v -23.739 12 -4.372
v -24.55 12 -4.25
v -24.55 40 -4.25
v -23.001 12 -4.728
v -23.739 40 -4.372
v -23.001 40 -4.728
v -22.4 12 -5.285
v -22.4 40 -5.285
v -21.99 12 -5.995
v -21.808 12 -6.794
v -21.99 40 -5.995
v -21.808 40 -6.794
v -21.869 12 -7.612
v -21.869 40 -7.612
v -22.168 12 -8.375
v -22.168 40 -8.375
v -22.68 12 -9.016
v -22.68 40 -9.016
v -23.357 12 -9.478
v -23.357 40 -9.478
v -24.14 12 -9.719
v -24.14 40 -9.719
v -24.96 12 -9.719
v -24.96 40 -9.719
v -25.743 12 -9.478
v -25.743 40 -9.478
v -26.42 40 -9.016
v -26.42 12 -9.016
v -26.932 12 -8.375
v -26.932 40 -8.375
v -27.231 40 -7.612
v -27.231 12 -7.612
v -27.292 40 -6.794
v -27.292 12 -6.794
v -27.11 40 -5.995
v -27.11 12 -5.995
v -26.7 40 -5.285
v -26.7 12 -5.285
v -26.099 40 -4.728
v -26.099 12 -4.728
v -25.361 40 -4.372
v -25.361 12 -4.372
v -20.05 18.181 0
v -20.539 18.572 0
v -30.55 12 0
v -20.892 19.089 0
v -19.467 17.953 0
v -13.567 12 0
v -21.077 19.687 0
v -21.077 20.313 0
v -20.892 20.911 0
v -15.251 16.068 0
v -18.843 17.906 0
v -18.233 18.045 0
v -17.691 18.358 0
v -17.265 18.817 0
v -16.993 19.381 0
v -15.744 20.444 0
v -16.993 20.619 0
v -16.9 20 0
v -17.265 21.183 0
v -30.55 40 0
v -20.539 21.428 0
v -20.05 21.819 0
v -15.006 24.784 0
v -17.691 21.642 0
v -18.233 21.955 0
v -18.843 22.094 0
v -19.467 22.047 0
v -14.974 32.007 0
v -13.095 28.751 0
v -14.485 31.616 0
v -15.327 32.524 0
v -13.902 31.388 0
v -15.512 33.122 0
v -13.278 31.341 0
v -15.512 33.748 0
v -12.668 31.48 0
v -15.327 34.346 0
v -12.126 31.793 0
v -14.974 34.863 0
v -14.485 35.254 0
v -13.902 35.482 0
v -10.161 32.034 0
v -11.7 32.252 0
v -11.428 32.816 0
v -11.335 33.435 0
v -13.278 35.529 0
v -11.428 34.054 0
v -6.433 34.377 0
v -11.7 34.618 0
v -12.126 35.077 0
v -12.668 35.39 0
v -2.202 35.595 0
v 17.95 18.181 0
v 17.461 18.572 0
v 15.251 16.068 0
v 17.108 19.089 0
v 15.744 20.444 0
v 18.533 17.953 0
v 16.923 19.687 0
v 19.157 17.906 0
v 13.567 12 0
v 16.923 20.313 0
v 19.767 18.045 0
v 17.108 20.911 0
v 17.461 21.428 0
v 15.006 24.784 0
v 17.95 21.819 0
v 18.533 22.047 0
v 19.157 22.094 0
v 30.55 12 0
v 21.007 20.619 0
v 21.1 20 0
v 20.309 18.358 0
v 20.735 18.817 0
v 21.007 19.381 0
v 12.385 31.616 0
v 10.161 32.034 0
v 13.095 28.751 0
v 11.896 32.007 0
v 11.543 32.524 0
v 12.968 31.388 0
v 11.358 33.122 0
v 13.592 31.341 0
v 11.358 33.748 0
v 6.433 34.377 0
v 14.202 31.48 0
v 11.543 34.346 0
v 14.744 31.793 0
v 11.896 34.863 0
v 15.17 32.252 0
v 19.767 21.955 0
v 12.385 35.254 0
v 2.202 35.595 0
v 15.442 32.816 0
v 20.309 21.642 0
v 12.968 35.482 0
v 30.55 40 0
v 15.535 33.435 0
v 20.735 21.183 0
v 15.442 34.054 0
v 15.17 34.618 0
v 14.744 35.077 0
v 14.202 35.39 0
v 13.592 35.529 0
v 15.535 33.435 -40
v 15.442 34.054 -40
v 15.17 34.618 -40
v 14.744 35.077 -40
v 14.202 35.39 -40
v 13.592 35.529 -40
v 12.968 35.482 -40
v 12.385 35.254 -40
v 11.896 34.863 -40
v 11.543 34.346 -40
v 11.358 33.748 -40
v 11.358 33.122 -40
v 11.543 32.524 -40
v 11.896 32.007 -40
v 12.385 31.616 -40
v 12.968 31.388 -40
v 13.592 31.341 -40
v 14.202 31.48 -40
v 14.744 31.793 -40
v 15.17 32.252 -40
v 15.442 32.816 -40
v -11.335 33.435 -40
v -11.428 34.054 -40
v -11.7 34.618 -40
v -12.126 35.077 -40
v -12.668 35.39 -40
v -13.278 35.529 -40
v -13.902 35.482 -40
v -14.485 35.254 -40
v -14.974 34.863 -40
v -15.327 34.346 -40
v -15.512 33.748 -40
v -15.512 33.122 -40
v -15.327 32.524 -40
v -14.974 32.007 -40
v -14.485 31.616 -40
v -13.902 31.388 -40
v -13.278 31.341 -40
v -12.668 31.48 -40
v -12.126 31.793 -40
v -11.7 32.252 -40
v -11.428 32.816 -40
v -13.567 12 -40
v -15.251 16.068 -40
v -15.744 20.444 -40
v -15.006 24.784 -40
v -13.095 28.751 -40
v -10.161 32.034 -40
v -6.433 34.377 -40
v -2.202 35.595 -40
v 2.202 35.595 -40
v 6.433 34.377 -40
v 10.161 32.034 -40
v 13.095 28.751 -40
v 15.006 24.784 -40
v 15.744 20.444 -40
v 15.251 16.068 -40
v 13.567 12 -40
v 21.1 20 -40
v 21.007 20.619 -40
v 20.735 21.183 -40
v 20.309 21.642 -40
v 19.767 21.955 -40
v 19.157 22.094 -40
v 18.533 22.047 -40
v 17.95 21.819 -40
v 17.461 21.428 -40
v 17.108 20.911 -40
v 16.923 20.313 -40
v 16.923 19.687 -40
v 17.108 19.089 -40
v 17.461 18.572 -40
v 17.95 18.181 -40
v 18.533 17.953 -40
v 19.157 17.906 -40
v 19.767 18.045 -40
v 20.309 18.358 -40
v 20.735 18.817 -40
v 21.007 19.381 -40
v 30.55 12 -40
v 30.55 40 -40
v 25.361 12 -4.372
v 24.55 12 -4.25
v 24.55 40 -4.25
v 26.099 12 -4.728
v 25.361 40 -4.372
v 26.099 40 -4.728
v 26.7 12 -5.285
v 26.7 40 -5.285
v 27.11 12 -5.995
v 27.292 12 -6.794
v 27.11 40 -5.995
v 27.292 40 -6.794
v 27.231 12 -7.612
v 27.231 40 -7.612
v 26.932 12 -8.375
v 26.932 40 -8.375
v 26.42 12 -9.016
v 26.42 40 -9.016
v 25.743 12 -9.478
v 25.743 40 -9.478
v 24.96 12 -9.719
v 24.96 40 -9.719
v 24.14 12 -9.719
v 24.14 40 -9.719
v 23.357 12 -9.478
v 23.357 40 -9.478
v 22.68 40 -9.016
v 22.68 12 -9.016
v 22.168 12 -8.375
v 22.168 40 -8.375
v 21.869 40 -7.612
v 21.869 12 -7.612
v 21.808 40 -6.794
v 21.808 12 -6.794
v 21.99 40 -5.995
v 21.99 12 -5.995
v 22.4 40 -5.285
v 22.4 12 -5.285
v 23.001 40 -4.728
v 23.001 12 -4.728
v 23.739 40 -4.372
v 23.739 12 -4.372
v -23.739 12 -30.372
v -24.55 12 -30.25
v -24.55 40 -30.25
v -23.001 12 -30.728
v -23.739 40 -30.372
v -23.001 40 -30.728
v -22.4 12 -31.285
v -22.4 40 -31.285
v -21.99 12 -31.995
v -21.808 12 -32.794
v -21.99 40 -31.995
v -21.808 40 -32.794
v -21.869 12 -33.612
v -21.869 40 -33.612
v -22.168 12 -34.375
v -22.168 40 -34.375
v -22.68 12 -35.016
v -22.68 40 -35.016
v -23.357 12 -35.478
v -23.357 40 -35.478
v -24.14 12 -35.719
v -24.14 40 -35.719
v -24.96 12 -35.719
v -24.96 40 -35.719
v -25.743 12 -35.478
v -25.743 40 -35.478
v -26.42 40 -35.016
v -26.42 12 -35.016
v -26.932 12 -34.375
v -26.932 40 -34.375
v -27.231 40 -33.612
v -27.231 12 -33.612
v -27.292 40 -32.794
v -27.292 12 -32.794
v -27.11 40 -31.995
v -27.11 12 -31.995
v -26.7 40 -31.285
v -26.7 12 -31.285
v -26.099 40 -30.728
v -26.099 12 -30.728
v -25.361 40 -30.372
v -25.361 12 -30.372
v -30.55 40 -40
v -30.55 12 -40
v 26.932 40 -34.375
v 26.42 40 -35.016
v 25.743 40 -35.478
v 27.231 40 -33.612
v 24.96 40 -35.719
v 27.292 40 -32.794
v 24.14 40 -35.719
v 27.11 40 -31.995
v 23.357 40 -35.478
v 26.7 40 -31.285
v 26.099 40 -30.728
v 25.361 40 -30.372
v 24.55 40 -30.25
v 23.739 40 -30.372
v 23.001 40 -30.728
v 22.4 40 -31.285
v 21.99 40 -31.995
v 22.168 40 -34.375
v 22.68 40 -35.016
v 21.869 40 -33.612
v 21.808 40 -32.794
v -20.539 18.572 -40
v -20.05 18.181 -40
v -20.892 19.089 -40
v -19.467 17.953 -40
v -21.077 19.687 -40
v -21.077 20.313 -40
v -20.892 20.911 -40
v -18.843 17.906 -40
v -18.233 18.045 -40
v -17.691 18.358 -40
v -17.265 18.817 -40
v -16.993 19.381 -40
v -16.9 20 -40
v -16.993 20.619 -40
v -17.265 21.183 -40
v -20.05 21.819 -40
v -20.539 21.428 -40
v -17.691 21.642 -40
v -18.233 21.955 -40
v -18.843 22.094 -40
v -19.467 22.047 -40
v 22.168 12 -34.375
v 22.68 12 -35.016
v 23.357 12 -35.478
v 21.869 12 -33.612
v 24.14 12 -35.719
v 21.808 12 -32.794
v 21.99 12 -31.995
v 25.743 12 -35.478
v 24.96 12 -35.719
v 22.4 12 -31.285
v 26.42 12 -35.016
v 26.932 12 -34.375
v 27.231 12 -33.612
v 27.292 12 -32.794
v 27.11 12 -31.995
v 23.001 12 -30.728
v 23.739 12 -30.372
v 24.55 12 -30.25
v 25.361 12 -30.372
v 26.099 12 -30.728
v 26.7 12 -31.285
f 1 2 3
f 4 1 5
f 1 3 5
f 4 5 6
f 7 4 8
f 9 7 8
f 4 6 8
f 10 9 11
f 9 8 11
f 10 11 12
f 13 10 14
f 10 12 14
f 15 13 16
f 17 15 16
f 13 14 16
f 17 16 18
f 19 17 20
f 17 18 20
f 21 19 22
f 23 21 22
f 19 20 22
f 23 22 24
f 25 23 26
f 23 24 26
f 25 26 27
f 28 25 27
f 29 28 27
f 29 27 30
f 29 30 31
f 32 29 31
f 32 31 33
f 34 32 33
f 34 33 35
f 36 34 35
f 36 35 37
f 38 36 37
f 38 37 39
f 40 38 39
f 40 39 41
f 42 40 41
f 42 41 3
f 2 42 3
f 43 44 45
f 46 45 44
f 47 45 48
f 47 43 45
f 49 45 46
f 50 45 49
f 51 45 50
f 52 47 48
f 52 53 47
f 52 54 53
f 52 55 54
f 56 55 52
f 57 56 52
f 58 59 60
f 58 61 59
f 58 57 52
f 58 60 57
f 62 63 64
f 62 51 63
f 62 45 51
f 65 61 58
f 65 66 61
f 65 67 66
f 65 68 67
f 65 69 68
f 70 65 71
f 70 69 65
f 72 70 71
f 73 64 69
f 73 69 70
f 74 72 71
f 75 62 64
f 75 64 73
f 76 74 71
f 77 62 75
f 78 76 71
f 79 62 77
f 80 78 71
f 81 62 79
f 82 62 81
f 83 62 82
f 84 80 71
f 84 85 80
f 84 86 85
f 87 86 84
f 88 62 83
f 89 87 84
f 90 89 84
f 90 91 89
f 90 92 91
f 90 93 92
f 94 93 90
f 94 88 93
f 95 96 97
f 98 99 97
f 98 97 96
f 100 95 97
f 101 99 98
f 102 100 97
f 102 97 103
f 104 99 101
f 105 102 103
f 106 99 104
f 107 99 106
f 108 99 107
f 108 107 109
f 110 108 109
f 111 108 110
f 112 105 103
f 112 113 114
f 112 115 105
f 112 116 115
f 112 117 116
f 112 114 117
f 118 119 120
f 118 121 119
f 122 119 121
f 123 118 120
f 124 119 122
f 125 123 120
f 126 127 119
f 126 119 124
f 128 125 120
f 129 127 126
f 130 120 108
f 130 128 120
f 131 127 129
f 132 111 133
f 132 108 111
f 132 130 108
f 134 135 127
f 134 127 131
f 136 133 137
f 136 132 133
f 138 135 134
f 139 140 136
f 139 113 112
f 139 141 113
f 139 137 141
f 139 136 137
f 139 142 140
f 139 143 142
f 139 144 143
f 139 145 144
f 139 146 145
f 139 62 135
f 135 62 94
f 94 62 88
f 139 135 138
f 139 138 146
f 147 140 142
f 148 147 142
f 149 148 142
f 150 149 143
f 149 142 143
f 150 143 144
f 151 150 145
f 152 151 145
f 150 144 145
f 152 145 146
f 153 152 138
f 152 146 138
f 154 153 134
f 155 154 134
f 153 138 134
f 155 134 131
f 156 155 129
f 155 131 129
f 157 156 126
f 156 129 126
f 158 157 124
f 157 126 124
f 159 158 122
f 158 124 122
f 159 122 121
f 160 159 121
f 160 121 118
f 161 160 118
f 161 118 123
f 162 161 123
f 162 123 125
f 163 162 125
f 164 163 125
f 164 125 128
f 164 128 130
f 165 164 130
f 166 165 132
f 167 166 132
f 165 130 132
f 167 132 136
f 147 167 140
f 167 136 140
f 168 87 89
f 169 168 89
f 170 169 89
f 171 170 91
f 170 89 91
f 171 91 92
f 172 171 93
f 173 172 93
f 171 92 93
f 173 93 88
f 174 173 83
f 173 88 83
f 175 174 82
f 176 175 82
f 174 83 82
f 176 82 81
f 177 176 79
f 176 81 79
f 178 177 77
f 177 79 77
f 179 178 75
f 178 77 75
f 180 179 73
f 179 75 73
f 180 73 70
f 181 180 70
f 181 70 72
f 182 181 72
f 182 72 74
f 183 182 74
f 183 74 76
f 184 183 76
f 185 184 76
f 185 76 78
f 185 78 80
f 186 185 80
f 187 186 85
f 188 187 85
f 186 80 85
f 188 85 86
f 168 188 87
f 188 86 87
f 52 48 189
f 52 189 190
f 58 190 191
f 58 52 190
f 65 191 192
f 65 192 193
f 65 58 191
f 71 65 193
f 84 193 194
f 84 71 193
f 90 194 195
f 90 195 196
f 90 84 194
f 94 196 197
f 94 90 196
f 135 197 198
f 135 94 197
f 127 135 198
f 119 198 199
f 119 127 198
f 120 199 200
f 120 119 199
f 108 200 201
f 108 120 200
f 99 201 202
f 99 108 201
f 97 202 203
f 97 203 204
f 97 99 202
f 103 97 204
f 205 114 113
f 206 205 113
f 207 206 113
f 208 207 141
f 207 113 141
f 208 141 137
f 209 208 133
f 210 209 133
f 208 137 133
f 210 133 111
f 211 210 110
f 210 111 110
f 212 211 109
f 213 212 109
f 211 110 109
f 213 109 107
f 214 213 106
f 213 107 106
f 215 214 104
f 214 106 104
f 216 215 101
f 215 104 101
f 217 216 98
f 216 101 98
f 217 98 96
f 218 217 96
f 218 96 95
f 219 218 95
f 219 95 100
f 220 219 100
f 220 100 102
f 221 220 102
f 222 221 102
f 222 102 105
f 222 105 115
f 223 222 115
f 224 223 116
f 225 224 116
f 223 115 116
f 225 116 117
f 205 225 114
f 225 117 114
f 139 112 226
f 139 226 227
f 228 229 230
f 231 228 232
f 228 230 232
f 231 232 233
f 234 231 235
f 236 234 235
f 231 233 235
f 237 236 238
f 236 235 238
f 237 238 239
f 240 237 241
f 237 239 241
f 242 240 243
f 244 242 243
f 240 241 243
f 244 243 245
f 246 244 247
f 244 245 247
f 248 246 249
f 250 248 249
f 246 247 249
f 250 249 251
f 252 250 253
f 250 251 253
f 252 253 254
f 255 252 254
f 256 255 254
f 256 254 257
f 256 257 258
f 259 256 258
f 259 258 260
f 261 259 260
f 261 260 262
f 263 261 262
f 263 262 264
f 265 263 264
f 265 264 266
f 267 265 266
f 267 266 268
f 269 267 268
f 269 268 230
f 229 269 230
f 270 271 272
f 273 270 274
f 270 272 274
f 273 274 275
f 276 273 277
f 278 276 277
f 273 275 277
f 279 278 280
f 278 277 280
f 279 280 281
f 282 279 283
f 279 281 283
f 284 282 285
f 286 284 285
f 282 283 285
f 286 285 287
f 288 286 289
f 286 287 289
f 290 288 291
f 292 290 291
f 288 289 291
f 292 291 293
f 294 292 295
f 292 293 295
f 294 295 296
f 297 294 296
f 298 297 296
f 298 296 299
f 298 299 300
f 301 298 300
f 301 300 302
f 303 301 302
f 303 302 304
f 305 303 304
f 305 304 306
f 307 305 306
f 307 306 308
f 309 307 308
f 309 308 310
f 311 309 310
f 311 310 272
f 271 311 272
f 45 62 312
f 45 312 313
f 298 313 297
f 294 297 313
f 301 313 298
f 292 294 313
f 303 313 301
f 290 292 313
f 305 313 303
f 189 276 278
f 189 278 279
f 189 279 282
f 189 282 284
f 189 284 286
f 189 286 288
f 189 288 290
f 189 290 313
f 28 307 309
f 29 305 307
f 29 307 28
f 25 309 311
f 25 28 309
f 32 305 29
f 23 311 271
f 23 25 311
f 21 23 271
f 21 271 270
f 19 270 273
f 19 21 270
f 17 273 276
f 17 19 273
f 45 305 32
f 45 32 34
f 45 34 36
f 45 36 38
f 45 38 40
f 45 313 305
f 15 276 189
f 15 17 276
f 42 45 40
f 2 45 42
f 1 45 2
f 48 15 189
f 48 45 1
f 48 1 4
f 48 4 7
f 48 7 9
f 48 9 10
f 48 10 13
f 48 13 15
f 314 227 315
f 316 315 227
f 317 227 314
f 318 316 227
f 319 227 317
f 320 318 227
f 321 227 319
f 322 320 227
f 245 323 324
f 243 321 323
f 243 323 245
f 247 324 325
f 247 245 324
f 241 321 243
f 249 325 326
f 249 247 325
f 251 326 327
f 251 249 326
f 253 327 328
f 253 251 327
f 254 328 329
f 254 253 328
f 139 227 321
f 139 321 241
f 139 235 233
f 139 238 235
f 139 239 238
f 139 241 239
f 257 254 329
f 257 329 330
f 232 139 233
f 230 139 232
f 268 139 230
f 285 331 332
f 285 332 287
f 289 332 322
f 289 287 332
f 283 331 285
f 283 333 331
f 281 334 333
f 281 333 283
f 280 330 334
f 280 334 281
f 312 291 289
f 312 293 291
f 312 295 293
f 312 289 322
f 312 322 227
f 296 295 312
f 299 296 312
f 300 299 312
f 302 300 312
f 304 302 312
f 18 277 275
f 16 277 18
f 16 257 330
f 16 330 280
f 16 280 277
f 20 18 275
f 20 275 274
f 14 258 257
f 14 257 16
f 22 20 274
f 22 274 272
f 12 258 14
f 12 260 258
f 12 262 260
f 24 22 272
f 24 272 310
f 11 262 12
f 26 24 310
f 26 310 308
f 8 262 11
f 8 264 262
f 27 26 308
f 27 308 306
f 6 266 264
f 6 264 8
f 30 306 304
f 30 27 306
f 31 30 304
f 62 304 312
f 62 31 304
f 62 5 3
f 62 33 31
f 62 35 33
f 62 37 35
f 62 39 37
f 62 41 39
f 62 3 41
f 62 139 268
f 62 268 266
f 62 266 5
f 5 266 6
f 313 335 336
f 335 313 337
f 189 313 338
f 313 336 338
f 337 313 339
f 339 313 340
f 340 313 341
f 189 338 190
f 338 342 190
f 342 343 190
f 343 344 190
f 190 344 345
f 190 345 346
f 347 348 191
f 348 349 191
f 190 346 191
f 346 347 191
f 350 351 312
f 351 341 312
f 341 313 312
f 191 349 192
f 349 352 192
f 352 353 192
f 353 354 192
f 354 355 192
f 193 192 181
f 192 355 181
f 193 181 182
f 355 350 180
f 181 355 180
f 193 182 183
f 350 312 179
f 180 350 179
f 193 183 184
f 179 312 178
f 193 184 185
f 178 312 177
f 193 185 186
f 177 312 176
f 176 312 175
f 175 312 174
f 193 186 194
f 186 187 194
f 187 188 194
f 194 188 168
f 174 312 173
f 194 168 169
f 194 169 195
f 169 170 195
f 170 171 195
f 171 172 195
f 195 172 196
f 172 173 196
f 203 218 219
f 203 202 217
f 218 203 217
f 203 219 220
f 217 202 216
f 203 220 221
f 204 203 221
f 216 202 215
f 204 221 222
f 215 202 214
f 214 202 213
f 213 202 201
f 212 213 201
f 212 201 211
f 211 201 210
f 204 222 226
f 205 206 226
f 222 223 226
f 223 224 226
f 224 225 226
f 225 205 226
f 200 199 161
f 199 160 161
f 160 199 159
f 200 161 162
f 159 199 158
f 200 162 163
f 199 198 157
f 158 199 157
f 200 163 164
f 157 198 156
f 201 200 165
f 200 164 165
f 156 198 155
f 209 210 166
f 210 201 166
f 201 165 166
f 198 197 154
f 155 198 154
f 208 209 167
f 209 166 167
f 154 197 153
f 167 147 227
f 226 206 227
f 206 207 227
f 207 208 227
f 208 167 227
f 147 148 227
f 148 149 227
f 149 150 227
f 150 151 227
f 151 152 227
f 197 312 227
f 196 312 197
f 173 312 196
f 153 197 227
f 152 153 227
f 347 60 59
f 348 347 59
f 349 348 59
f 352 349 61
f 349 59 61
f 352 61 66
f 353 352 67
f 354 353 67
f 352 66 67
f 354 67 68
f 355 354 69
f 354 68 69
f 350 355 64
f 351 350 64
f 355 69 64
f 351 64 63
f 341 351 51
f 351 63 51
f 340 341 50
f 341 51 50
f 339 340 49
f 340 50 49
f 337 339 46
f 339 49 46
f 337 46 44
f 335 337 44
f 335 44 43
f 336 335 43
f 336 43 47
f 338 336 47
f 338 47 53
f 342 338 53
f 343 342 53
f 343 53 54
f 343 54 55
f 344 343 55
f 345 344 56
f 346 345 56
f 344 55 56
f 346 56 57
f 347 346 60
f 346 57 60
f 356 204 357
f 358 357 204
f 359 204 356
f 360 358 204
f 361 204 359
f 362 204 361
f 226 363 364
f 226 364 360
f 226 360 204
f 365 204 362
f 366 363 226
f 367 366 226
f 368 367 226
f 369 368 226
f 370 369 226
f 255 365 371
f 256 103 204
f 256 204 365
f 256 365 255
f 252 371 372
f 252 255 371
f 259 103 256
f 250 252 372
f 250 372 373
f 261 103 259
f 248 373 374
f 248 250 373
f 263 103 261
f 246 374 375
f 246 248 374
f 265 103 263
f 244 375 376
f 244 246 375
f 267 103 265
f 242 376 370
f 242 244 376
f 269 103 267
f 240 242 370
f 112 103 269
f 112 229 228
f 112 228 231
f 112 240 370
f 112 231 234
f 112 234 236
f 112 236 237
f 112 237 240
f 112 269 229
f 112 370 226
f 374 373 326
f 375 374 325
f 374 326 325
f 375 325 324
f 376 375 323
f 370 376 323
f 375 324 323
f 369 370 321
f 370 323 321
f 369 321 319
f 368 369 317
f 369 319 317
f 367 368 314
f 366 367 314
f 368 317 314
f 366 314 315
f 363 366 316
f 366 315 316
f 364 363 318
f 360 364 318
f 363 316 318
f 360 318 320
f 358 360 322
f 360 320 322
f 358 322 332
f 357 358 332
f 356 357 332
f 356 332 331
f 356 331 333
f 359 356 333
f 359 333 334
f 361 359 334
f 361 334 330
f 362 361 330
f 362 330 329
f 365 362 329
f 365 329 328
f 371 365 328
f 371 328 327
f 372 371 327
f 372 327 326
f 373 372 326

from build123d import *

# Parameters (mm, degrees)
SKETCH1_R           = 2.1
BOSS_EXTRUDE1_DEPTH = 40
SKETCH2_R           = 2.75
CUT_EXTRUDE1_DEPTH  = 50


with BuildPart() as part:
    # Sketch1 → Boss-Extrude1 (new body)
    with BuildSketch(Plane.XY):
        with BuildLine():
            Line((13.266499161, 40), (-13.266499161, 40))
            Line((-13.266499161, 40), (-27.55, 40))
            Line((-27.55, 40), (-30.55, 40))
            Line((-30.55, 40), (-30.55, 12))
            Line((-30.55, 12), (-27.55, 12))
            Line((-27.55, 12), (-13.566963551, 12))
            ThreePointArc((-13.566963551, 12), (0, 35.75), (13.566963551, 12))
            Line((13.566963551, 12), (27.55, 12))
            Line((27.55, 12), (30.55, 12))
            Line((30.55, 12), (30.55, 40))
            Line((30.55, 40), (27.55, 40))
            Line((27.55, 40), (13.266499161, 40))
        make_face()
        with Locations((-13.435028843, 33.435028843)):
            Circle(SKETCH1_R, mode=Mode.SUBTRACT)
        with Locations((19, 20)):
            Circle(SKETCH1_R, mode=Mode.SUBTRACT)
        with Locations((13.435028843, 33.435028843)):
            Circle(SKETCH1_R, mode=Mode.SUBTRACT)
        with Locations((-19, 20)):
            Circle(SKETCH1_R, mode=Mode.SUBTRACT)
    extrude(amount=-BOSS_EXTRUDE1_DEPTH)

    # Sketch2 → Cut-Extrude1 (cut)
    with BuildSketch(Plane(origin=(0, 40, 0), x_dir=(1, 0, 0), z_dir=(0, 1, 0))):
        with Locations(Location((-24.55, 33, 0), (0, 0, 270))):
            Circle(SKETCH2_R)
        with Locations(Location((-24.55, 7, 0), (0, 0, 270))):
            Circle(SKETCH2_R)
        with Locations(Location((24.55, 7, 0), (0, 0, 270))):
            Circle(SKETCH2_R)
        with Locations(Location((24.55, 33, 0), (0, 0, 270))):
            Circle(SKETCH2_R)
    extrude(amount=-CUT_EXTRUDE1_DEPTH, mode=Mode.SUBTRACT)


solid = part.part
